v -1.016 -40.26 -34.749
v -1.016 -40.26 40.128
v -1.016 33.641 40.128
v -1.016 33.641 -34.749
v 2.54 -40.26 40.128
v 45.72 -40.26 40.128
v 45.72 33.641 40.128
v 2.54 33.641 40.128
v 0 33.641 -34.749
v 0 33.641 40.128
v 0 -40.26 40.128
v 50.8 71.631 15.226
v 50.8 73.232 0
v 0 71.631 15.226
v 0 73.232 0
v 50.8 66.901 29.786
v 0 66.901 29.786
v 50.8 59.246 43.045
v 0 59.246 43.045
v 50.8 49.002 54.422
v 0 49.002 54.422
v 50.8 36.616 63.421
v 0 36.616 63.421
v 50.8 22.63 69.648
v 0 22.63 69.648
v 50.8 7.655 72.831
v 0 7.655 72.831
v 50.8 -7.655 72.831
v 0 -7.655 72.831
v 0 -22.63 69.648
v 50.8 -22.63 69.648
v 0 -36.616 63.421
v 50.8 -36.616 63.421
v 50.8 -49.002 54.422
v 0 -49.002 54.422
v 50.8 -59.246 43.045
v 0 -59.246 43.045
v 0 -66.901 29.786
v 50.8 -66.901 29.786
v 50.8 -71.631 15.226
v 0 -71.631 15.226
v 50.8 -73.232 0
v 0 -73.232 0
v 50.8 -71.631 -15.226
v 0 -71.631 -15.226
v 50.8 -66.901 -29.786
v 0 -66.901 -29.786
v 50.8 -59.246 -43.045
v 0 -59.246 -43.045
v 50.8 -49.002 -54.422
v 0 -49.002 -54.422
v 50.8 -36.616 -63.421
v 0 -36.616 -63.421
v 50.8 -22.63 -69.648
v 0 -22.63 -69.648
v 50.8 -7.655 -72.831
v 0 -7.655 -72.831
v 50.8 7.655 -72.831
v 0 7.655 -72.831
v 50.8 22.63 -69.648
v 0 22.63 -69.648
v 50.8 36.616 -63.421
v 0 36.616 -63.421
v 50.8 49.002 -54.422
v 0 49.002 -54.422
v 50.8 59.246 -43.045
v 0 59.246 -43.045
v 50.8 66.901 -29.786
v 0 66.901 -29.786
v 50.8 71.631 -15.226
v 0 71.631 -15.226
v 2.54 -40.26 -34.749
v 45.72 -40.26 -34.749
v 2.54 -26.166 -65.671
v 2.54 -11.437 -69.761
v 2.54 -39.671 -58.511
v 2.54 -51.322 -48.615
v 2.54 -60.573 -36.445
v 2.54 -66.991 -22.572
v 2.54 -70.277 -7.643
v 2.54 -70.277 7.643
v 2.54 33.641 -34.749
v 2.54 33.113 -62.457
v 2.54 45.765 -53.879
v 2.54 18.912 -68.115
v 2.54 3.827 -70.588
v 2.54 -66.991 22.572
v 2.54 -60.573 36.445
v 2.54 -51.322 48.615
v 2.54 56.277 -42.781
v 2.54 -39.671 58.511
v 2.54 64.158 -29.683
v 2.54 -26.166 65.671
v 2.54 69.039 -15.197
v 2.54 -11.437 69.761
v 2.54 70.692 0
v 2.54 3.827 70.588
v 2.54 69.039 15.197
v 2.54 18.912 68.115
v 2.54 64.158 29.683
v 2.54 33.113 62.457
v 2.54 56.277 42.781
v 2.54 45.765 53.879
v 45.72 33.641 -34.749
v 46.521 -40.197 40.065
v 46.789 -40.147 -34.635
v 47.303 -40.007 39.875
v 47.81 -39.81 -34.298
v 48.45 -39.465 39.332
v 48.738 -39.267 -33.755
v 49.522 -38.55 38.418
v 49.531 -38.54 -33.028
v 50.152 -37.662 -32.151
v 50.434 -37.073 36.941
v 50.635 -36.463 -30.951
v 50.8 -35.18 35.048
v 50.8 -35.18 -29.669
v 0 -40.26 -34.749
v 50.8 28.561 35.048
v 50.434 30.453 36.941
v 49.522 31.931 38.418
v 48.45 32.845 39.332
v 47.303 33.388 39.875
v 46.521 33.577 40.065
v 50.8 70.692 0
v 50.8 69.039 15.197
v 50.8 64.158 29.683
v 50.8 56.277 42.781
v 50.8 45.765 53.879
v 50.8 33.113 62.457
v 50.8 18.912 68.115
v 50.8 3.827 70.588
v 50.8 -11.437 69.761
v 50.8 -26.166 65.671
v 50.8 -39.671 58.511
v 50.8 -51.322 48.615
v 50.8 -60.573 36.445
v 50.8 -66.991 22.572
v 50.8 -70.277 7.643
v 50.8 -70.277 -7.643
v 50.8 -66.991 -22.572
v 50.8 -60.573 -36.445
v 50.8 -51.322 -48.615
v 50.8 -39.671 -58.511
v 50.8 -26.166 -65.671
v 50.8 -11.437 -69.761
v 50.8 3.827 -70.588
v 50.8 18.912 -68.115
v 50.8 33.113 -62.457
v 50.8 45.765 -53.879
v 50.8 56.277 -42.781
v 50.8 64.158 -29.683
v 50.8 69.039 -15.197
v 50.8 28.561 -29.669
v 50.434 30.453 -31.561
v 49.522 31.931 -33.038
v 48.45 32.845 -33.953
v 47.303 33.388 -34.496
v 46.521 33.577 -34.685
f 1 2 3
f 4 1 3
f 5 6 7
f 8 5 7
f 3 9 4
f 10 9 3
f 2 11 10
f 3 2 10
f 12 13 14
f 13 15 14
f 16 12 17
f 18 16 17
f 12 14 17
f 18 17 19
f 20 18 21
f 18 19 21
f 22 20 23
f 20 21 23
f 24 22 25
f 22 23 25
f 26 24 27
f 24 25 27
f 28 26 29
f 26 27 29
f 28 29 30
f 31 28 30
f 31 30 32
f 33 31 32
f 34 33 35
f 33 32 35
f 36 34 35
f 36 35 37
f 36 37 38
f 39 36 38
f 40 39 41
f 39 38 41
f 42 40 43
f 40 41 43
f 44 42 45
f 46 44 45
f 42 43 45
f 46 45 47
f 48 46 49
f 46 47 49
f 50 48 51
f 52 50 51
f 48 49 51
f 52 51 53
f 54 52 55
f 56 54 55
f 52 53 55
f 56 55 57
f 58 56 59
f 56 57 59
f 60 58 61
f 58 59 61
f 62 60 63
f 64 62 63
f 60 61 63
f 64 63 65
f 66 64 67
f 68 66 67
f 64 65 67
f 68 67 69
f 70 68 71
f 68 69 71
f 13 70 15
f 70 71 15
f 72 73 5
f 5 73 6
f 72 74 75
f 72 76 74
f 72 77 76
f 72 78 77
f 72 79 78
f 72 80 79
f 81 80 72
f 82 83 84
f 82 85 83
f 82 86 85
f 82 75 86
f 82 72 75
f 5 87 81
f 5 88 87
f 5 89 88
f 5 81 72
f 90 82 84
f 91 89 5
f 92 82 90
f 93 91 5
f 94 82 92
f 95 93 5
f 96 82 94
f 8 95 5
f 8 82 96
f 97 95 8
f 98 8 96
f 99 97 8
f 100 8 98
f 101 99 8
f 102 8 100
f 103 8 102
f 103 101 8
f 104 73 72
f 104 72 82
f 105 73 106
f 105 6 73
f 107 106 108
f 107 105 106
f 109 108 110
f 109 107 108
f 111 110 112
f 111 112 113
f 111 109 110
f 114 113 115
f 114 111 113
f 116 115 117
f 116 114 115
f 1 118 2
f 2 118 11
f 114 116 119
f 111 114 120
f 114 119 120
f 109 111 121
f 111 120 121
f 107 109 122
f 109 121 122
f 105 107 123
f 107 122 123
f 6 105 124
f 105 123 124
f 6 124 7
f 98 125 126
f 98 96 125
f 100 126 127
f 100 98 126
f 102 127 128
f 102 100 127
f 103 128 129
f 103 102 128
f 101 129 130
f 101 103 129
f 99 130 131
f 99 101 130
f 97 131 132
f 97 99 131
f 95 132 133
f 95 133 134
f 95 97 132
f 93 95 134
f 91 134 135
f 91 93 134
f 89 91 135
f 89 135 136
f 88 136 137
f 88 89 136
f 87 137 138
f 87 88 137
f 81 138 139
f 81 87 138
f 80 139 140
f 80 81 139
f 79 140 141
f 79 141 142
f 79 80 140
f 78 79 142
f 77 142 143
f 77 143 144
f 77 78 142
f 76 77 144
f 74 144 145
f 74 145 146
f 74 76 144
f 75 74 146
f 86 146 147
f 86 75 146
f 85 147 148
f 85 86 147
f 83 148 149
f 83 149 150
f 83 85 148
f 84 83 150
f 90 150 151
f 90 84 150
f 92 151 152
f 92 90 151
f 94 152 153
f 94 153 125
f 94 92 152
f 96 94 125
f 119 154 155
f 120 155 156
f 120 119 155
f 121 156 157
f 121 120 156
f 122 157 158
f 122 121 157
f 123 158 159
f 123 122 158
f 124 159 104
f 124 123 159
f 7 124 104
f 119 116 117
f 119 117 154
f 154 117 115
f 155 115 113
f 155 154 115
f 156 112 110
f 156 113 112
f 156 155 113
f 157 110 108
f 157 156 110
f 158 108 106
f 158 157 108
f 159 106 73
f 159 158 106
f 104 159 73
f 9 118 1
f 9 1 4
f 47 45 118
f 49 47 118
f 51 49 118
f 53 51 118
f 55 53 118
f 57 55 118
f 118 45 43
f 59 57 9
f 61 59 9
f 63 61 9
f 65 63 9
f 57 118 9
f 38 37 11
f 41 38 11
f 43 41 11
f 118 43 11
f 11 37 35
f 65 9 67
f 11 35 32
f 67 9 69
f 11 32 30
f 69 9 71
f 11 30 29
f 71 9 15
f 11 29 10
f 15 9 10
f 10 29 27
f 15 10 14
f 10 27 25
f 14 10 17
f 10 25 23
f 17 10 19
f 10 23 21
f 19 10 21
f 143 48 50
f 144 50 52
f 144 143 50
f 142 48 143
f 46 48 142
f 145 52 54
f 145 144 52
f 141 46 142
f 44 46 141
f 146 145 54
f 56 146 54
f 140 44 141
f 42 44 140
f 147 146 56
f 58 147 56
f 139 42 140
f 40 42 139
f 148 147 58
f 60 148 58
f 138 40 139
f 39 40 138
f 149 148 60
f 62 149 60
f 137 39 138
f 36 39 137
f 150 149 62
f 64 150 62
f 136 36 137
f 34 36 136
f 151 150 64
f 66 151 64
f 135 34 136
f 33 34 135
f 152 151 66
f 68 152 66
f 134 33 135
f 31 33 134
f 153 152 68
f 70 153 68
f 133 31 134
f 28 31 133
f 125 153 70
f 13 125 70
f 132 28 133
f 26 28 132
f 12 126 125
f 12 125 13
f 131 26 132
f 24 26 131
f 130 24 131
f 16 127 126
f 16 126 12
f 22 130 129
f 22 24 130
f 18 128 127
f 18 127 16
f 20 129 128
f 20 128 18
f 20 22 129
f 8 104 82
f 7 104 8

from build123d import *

# Parameters (mm, degrees)
F0_R     = 73.2317789394
F1_DEPTH = 25.4
F2_DEPTH = 25.4
F4_T     = -2.54
F3_W     = 73.9012621343
F3_H     = 74.8767629266
F5_DEPTH = 51.816
F6_R     = 5.08


with BuildPart() as f1:
    # F0 (on Right) → F1 (new body)
    with BuildSketch(Plane.YZ):
        Circle(F0_R)
    extrude(amount=F1_DEPTH)

    # F2 (add): a face of the model
    f2_faces = [f1.faces().sort_by_distance(p)[0] for p in [
        (25.4, 0, 0),
    ]]
    extrude(f2_faces, amount=F2_DEPTH)

    # F4
    f4_openings = [f1.faces().sort_by_distance(p)[0] for p in [
        (50.8, 0, 0),
    ]]
    offset(amount=F4_T, openings=f4_openings)

    # F3 (on face) → F5 (join)
    with BuildSketch(Plane.YZ.offset(50.8)):
        with Locations((-3.3096689731, 2.6898309588)):
            Rectangle(F3_W, F3_H)
    extrude(amount=-F5_DEPTH)

    # F6
    f6_edges = [f1.edges().sort_by_distance(p)[0] for p in [
        (50.8, -3.309669, 40.128212),
        (50.8, -40.2603, 2.689831),
        (50.8, 33.640962, 2.689831),
        (50.8, -3.309669, -34.748551),
    ]]
    fillet(f6_edges, radius=F6_R)


solid = f1.part
